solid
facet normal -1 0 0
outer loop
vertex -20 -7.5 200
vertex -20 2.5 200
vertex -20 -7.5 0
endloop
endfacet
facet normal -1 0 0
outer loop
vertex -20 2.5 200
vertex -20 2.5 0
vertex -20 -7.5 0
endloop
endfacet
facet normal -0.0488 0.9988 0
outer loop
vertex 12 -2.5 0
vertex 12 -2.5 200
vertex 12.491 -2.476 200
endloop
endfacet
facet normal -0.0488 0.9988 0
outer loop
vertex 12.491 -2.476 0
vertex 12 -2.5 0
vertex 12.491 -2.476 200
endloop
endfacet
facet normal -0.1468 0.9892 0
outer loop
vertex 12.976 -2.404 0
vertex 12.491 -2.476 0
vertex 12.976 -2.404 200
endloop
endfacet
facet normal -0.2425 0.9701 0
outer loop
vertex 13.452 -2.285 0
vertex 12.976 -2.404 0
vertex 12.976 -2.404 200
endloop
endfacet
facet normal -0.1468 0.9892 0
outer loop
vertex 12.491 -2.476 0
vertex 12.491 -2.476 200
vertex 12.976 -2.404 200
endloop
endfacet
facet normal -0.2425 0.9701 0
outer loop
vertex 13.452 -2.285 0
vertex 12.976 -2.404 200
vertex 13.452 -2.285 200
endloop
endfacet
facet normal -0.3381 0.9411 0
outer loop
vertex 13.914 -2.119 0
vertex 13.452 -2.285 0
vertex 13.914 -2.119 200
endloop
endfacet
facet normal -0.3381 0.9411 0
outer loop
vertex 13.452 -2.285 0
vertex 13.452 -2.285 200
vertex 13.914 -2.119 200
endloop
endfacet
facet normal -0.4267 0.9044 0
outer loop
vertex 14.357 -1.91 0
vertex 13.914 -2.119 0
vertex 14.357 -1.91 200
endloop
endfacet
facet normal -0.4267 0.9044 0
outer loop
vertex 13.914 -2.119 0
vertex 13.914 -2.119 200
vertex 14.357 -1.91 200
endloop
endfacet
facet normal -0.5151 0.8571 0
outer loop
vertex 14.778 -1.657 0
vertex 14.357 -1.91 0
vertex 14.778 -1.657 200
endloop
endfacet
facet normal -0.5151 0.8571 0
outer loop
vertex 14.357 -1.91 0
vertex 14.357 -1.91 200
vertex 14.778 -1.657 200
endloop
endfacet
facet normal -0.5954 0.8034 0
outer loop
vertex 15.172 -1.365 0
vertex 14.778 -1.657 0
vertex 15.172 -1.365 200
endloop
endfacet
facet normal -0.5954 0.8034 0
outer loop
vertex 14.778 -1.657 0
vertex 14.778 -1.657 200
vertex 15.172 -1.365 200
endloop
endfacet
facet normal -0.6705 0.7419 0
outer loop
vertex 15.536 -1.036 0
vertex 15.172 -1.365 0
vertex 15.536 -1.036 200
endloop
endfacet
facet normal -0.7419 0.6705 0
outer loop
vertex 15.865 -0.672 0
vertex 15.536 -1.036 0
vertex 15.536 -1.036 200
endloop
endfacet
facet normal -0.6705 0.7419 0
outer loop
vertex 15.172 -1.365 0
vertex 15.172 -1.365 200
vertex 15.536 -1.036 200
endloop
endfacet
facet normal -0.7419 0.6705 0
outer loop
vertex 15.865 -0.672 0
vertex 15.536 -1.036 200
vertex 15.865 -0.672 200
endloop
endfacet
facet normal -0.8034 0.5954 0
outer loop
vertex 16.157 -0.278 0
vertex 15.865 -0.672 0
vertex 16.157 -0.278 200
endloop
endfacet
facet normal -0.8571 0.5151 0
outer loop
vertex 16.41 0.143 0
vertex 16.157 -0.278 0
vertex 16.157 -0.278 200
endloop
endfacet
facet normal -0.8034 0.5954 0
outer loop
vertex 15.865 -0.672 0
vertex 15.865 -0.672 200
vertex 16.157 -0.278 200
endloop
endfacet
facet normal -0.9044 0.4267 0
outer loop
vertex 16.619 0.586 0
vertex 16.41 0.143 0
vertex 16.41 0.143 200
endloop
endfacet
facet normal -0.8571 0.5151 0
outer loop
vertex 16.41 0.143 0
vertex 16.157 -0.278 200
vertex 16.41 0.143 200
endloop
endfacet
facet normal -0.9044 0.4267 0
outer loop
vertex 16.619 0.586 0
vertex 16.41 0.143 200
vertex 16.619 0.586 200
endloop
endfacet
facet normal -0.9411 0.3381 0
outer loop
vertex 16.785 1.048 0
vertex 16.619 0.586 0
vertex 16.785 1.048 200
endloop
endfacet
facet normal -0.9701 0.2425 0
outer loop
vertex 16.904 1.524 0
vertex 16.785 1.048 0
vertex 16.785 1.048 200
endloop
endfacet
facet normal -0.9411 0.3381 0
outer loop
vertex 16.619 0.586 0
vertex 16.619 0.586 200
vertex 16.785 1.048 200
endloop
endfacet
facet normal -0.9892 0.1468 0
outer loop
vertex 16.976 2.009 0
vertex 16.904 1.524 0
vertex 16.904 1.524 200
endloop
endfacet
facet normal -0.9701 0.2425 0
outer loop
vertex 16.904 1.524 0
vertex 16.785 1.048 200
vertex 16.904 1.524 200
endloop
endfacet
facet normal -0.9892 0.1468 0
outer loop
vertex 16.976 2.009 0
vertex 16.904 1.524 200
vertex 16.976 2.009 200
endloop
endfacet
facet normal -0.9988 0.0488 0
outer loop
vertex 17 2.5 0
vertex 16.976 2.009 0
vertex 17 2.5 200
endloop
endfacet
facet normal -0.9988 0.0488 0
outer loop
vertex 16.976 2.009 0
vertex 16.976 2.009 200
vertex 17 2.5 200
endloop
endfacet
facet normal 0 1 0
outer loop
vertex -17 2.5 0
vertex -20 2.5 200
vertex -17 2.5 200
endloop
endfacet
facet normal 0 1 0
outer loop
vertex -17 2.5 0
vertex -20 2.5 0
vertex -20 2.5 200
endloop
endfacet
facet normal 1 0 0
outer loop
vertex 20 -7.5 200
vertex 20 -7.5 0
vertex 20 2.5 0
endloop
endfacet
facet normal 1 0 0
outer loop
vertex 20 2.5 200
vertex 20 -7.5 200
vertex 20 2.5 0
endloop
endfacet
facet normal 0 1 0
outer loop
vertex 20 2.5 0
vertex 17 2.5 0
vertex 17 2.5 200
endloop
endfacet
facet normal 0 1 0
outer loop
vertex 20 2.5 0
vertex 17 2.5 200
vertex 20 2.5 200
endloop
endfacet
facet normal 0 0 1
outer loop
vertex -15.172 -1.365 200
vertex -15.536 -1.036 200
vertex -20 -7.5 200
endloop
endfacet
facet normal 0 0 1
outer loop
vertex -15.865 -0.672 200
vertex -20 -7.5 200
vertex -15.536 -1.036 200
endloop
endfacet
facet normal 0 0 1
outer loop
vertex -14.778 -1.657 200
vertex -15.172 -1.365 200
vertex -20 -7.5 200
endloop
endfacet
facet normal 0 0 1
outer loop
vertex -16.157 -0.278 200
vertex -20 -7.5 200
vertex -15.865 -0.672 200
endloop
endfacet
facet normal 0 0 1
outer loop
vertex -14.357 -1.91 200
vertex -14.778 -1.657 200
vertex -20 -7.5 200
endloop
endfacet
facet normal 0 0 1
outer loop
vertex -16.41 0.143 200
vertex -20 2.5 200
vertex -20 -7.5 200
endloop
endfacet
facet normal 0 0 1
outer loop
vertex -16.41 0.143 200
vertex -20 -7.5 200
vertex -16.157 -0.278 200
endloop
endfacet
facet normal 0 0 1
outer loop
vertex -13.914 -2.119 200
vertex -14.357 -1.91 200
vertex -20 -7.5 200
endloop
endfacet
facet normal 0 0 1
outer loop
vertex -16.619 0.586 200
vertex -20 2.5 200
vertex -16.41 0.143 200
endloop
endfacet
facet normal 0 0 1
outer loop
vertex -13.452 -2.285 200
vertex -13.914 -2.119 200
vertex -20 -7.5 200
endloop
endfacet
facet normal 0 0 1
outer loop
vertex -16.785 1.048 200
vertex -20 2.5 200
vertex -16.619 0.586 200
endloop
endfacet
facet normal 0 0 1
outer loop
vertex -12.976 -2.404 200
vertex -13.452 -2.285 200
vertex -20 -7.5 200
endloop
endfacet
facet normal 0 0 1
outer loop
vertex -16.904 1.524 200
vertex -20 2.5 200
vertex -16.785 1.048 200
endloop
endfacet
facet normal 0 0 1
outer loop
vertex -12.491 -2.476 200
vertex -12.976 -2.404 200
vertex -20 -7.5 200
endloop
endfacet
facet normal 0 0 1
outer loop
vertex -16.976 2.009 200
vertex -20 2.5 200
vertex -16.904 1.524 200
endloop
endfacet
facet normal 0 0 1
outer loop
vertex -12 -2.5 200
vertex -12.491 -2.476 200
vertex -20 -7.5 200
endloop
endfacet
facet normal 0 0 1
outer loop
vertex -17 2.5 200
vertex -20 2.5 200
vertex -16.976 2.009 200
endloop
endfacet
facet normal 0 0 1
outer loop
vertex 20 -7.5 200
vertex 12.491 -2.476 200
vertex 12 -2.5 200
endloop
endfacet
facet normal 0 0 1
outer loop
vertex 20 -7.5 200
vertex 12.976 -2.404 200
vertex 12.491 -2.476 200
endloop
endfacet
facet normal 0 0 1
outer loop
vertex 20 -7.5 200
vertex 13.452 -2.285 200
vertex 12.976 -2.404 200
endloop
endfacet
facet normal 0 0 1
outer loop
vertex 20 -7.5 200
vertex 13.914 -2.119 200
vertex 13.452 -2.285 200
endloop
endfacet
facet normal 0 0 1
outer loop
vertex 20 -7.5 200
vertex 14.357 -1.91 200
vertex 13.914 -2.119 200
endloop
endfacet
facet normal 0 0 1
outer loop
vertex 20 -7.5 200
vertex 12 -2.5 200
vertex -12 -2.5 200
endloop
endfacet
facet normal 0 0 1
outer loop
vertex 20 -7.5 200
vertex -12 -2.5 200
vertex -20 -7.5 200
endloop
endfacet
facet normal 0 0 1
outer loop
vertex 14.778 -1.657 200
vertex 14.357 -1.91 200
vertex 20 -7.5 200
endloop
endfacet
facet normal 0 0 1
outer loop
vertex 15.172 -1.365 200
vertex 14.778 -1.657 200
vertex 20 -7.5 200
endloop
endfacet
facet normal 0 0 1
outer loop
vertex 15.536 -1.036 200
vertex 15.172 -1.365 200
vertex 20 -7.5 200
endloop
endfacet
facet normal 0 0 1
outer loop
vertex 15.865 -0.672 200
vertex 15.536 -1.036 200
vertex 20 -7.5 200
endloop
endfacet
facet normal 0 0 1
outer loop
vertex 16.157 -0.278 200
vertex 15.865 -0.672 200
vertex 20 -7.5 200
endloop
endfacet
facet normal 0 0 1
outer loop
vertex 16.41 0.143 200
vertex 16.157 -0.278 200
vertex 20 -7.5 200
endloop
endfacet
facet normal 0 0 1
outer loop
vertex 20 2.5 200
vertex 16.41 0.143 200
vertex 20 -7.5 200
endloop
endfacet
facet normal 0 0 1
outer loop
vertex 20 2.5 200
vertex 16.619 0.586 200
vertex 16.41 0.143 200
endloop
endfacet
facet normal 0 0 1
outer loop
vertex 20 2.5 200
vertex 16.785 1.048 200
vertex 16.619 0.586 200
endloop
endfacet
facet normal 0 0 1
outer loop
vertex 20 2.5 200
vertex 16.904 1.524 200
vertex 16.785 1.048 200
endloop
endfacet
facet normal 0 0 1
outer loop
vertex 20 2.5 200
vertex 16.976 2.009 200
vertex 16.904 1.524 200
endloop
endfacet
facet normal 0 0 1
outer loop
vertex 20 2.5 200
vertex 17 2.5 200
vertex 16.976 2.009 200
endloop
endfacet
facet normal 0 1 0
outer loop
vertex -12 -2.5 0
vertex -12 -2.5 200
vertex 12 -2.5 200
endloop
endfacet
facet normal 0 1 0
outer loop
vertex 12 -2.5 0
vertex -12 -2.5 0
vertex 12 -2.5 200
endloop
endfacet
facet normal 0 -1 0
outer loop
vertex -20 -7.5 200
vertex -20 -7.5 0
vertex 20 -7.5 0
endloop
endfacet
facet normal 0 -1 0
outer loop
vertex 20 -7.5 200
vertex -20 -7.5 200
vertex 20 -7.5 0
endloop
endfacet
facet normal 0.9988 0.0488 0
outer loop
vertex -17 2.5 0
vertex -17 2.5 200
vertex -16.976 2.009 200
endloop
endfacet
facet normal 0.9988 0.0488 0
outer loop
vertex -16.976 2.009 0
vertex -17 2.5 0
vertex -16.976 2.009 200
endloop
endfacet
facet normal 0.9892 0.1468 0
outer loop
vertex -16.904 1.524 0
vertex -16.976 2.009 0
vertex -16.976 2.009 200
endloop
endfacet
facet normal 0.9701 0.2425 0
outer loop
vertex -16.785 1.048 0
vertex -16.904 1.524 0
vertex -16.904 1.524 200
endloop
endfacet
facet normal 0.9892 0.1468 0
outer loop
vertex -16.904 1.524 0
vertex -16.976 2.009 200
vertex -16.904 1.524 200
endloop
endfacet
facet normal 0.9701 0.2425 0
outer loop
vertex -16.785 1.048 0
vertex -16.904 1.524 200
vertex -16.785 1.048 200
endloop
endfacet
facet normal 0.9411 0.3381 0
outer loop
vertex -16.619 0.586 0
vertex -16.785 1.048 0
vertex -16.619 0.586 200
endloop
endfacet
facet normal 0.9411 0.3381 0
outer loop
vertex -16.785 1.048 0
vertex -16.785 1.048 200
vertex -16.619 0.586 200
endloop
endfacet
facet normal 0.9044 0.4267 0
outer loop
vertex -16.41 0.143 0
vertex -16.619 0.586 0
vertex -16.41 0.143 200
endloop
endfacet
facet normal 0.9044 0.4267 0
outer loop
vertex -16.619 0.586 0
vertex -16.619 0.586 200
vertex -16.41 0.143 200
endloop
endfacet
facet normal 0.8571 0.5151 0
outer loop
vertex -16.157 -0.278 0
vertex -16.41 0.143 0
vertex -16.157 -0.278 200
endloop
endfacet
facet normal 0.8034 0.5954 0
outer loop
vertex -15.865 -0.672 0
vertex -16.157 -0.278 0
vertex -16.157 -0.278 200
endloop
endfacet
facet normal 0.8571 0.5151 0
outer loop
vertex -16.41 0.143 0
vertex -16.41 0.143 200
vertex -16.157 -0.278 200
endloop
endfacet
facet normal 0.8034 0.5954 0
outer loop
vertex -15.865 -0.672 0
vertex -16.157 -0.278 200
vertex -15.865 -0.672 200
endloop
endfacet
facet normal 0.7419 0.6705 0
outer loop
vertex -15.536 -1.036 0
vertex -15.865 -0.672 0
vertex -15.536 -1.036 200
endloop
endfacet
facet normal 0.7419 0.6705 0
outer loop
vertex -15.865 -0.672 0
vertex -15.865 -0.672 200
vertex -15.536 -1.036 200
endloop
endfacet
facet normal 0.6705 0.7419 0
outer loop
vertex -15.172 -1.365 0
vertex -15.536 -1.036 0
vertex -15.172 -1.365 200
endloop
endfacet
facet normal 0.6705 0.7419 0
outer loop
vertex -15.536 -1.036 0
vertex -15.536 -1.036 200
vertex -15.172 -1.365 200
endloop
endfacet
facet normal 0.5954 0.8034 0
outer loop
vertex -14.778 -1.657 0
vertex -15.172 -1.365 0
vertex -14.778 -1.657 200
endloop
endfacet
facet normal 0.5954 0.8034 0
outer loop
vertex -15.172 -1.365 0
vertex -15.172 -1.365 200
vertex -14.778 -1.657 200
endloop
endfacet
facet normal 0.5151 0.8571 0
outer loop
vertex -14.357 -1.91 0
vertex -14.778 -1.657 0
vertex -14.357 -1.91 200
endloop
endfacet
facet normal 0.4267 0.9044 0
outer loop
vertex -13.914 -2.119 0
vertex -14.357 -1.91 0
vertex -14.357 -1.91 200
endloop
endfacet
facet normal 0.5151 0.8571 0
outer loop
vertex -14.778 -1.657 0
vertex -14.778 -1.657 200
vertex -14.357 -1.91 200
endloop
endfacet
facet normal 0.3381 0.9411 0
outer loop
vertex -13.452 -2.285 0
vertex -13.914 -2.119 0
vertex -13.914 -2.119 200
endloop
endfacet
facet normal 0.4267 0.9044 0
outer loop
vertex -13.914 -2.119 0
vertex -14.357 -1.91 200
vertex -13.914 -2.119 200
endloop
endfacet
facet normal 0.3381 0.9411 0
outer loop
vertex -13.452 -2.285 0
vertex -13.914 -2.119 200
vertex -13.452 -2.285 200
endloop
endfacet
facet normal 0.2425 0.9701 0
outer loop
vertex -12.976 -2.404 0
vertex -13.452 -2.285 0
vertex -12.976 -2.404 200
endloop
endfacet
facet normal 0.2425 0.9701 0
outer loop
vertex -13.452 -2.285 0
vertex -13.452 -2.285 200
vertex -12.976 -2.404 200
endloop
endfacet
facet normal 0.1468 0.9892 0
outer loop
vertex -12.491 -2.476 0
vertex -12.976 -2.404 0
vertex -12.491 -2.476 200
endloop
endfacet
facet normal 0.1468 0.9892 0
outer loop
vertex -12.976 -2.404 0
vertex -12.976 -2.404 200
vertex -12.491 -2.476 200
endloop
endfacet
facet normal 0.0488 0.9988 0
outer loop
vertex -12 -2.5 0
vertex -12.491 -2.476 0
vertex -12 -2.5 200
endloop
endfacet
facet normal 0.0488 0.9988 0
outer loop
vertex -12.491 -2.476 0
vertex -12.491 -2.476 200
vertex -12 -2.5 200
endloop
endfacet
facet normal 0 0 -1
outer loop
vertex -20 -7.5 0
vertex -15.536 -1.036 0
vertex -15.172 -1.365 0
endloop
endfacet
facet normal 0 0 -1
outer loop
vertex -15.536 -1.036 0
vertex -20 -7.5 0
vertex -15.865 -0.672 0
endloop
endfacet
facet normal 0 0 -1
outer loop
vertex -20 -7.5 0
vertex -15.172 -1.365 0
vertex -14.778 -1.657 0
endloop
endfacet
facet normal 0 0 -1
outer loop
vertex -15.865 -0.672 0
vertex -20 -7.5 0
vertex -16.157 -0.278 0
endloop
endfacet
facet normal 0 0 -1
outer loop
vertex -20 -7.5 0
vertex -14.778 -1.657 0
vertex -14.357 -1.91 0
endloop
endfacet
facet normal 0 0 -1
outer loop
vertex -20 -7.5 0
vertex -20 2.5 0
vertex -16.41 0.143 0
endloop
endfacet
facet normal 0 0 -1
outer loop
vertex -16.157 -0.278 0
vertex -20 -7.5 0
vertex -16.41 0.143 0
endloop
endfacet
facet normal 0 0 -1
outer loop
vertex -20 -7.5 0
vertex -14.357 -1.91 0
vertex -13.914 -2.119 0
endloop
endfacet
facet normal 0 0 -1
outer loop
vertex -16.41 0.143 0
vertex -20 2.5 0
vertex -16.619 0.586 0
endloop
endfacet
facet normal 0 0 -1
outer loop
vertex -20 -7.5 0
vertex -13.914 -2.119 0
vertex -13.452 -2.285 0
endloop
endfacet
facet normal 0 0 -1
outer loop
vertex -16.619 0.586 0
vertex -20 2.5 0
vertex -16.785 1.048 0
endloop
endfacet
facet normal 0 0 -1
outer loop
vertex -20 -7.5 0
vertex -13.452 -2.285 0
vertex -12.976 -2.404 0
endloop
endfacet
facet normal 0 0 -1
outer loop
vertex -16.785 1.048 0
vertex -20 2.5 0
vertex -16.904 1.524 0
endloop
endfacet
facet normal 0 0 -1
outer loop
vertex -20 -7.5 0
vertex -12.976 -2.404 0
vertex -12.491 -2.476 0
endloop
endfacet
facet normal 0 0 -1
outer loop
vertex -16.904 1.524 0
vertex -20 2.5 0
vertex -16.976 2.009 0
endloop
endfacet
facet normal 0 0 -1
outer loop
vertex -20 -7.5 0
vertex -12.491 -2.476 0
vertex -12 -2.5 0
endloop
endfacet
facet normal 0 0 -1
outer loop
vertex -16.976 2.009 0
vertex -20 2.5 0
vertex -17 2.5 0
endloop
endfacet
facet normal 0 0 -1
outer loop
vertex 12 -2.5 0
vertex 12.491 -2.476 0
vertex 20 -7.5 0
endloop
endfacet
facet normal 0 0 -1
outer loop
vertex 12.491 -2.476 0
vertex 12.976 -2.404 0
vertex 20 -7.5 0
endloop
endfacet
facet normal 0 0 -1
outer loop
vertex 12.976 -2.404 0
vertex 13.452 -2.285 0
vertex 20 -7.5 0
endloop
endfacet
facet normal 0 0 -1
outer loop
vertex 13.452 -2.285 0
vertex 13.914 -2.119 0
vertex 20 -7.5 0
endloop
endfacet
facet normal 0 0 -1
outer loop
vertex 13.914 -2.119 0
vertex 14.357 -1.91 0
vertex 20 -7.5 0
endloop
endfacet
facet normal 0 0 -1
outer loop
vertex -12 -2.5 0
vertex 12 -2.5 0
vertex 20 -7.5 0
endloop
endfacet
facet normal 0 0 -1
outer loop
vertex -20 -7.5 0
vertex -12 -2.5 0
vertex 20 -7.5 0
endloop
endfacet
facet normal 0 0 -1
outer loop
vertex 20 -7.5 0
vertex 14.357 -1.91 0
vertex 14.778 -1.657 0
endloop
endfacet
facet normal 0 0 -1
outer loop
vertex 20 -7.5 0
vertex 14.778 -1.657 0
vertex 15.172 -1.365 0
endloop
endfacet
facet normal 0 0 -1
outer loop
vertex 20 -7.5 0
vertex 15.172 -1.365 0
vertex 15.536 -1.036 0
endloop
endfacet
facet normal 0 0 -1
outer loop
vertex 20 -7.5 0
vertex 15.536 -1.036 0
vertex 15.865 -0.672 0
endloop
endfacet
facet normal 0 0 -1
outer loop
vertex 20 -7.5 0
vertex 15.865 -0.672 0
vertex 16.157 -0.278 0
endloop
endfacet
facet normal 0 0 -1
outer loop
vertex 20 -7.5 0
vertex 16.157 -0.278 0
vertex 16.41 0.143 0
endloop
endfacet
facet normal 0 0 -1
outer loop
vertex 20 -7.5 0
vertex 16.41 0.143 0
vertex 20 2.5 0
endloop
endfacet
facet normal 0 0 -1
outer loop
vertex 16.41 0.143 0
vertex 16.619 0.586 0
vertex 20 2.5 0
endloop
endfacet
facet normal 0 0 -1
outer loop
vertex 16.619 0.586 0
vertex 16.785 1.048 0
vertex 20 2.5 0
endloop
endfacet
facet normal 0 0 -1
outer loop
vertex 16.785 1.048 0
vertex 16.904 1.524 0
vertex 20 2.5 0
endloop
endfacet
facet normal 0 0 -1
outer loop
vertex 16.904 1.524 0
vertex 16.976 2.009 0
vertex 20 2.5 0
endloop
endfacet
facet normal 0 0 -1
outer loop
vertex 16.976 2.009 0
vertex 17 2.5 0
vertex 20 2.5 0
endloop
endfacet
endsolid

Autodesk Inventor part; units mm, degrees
ref_plane "YZ Plane" through (0, 0, 0) normal (1, 0, 0) x (0, 1, 0)
ref_plane "XZ Plane" through (0, 0, 0) normal (0, 1, 0) x (-1, 0, 0)
ref_plane "XY Plane" through (0, 0, 0) normal (0, 0, 1) x (1, 0, 0)
sketch "Sketch1" plane through (0, 0, 0) normal (0, 0, 1) x (1, 0, 0)
  line L0 (-20, -7.5) -> (20, -7.5)
  line L1 (20, -7.5) -> (20, 2.5)
  line L2 (-20, 2.5) -> (-20, -7.5)
  line L3 (-17, -2.5) -> (-17, 2.5)
  line L4 (17, 2.5) -> (17, -2.5)
  line L5 (-21.1547, 2.5) -> (25.819, 2.5)
  line L6 (-17, -2.5) -> (17, -2.5)
  point P0 (0, 0)
  point P1 (0, -7.5)
  dimension "d2" = 3
  dimension "d7" = 40
  dimension "d8" = 3
  dimension "d9" = 10
  dimension "d10" = 5
  dimension "d17" = 34
  dimension "d18" = 5
extrude "Extrusion3" add sketch "Sketch1" along normal blind 200 contours L2 L5 L3 L6 L4 L1 L0
fillet "Fillet3" radius 5 1 edges at (-17, -2.5, 100)
fillet "Fillet4" radius 5 1 edges at (17, -2.5, 100)
